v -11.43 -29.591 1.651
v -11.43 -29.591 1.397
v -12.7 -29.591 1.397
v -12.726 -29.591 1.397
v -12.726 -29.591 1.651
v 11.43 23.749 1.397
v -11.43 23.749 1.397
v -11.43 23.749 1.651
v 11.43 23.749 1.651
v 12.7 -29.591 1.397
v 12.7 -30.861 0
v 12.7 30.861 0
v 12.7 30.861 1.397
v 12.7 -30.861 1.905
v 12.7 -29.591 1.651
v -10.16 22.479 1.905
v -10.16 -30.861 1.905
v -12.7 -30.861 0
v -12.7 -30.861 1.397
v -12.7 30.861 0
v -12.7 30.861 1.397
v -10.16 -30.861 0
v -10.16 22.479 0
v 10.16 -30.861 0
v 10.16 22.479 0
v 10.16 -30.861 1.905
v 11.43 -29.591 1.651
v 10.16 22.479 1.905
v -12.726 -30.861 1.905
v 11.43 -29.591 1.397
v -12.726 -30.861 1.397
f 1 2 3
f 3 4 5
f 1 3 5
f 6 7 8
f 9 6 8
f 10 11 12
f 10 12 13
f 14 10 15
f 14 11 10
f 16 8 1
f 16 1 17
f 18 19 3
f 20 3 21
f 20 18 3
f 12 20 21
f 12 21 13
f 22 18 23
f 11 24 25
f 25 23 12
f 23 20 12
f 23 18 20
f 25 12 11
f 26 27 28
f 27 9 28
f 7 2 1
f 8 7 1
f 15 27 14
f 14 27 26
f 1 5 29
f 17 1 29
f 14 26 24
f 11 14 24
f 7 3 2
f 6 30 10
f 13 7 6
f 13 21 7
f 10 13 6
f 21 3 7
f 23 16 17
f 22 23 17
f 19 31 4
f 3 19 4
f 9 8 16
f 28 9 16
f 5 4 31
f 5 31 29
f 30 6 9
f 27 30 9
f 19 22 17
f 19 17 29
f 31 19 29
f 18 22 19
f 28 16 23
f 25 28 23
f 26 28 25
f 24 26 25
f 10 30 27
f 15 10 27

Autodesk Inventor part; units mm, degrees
ref_plane "YZ Plane" through (0, 0, 0) normal (1, 0, 0) x (0, 1, 0)
ref_plane "XZ Plane" through (0, 0, 0) normal (0, 1, 0) x (-1, 0, 0)
ref_plane "XY Plane" through (0, 0, 0) normal (0, 0, 1) x (1, 0, 0)
sketch "Sketch1" plane through (0, 0, 0) normal (0, 0, 1) x (1, 0, 0)
  line L0 (-12.7, 30.861) -> (12.7, 30.861)
  line L1 (12.7, 30.861) -> (12.7, -30.861)
  line L2 (12.7, -30.861) -> (-12.7, -30.861)
  line L3 (-12.7, -30.861) -> (-12.7, 30.861)
  line L4 (-12.7, 30.861) -> (12.7, -30.861) construction
  line L5 (12.7, 30.861) -> (-12.7, -30.861) construction
  point P0 (0, 0)
  dimension "d0" = 25.4
  dimension "d1" = 61.722
extrude "Extrusion1" add sketch "Sketch1" along normal blind 1.397
sketch "Sketch2" plane through (0, 0, 1.397) normal (0, 0, 1) x (1, 0, 0)
  line L0 (-10.16, -30.861) -> (10.16, -30.861)
  line L1 (10.16, -30.861) -> (10.16, 22.479)
  line L2 (10.16, 22.479) -> (-10.16, 22.479)
  line L3 (-10.16, 22.479) -> (-10.16, -30.861)
  line L4 (-12.7, -30.861) -> (12.7, -30.861) projected
  point P0 (0, 0)
  point P1 (0, -30.861)
  dimension "d4" = 20.32
  dimension "d5" = 53.34
extrude "Extrusion2" cut sketch "Sketch2" against normal through all
sketch "Sketch3" plane through (12.7, -30.861, 0) normal (1, 0, 0) x (0, 0, -1)
  line L0 (0, 61.722) -> (0, 0) projected
  line L1 (0, 61.722) -> (-1.397, 61.722) projected
  line L2 (-1.397, 0) -> (-1.397, 61.722) projected
  line L3 (0, 0) -> (-1.397, 0) projected
  line L4 (-1.397, 0) -> (-1.905, 0)
  line L5 (-1.397, 0) -> (-1.397, 1.27)
  line L6 (-1.397, 53.34) -> (-1.397, 0) projected
  line L7 (-1.651, 1.27) -> (-1.397, 1.27)
  line L8 (-1.651, 1.27) -> (-1.905, 0)
  point P0 (0, 30.861)
  dimension "d8" = 0.508
  dimension "d9" = 1.27
  dimension "d10" = 0.254
ref_plane "Work Plane1" through (0, 0, 1.651) normal (0, 0, 1) x (1, 0, 0)
sketch "Sketch6" plane through (0, 0, 1.651) normal (0, 0, 1) x (1, 0, 0)
  line L0 (12.7, -29.591) -> (12.7, -30.861) projected
  line L1 (12.7, -30.861) -> (12.7, 30.861) projected
  line L2 (12.7, -30.226) -> (10.795, -30.226)
  line L3 (10.16, -30.861) -> (12.7, -30.861) projected
  line L4 (10.16, 22.479) -> (10.16, -30.861) projected
  line L5 (10.795, -30.226) -> (10.795, 23.114)
  line L6 (10.795, 23.114) -> (-10.795, 23.114)
  line L7 (-10.795, 23.114) -> (-10.795, -30.226)
  line L8 (-10.795, -30.226) -> (-12.7255, -30.226)
  line L9 (-12.7, -30.861) -> (-10.16, -30.861) projected
  line L10 (-10.16, -30.861) -> (-10.16, 22.479) projected
  line L11 (-10.16, 22.479) -> (10.16, 22.479) projected
  point P0 (0, 0)
  dimension "d12" = 0.635
  dimension "d13" = 0.635
  dimension "d14" = 0.635
  dimension "d15" = 0.635
  dimension "d16" = 0.635
sweep "Sweep1" add profiles "Sketch3" path "Sketch6" path curves L2 L5 L6 L7 L8 contours L4 L8 L7 L2
properties part number "door"
